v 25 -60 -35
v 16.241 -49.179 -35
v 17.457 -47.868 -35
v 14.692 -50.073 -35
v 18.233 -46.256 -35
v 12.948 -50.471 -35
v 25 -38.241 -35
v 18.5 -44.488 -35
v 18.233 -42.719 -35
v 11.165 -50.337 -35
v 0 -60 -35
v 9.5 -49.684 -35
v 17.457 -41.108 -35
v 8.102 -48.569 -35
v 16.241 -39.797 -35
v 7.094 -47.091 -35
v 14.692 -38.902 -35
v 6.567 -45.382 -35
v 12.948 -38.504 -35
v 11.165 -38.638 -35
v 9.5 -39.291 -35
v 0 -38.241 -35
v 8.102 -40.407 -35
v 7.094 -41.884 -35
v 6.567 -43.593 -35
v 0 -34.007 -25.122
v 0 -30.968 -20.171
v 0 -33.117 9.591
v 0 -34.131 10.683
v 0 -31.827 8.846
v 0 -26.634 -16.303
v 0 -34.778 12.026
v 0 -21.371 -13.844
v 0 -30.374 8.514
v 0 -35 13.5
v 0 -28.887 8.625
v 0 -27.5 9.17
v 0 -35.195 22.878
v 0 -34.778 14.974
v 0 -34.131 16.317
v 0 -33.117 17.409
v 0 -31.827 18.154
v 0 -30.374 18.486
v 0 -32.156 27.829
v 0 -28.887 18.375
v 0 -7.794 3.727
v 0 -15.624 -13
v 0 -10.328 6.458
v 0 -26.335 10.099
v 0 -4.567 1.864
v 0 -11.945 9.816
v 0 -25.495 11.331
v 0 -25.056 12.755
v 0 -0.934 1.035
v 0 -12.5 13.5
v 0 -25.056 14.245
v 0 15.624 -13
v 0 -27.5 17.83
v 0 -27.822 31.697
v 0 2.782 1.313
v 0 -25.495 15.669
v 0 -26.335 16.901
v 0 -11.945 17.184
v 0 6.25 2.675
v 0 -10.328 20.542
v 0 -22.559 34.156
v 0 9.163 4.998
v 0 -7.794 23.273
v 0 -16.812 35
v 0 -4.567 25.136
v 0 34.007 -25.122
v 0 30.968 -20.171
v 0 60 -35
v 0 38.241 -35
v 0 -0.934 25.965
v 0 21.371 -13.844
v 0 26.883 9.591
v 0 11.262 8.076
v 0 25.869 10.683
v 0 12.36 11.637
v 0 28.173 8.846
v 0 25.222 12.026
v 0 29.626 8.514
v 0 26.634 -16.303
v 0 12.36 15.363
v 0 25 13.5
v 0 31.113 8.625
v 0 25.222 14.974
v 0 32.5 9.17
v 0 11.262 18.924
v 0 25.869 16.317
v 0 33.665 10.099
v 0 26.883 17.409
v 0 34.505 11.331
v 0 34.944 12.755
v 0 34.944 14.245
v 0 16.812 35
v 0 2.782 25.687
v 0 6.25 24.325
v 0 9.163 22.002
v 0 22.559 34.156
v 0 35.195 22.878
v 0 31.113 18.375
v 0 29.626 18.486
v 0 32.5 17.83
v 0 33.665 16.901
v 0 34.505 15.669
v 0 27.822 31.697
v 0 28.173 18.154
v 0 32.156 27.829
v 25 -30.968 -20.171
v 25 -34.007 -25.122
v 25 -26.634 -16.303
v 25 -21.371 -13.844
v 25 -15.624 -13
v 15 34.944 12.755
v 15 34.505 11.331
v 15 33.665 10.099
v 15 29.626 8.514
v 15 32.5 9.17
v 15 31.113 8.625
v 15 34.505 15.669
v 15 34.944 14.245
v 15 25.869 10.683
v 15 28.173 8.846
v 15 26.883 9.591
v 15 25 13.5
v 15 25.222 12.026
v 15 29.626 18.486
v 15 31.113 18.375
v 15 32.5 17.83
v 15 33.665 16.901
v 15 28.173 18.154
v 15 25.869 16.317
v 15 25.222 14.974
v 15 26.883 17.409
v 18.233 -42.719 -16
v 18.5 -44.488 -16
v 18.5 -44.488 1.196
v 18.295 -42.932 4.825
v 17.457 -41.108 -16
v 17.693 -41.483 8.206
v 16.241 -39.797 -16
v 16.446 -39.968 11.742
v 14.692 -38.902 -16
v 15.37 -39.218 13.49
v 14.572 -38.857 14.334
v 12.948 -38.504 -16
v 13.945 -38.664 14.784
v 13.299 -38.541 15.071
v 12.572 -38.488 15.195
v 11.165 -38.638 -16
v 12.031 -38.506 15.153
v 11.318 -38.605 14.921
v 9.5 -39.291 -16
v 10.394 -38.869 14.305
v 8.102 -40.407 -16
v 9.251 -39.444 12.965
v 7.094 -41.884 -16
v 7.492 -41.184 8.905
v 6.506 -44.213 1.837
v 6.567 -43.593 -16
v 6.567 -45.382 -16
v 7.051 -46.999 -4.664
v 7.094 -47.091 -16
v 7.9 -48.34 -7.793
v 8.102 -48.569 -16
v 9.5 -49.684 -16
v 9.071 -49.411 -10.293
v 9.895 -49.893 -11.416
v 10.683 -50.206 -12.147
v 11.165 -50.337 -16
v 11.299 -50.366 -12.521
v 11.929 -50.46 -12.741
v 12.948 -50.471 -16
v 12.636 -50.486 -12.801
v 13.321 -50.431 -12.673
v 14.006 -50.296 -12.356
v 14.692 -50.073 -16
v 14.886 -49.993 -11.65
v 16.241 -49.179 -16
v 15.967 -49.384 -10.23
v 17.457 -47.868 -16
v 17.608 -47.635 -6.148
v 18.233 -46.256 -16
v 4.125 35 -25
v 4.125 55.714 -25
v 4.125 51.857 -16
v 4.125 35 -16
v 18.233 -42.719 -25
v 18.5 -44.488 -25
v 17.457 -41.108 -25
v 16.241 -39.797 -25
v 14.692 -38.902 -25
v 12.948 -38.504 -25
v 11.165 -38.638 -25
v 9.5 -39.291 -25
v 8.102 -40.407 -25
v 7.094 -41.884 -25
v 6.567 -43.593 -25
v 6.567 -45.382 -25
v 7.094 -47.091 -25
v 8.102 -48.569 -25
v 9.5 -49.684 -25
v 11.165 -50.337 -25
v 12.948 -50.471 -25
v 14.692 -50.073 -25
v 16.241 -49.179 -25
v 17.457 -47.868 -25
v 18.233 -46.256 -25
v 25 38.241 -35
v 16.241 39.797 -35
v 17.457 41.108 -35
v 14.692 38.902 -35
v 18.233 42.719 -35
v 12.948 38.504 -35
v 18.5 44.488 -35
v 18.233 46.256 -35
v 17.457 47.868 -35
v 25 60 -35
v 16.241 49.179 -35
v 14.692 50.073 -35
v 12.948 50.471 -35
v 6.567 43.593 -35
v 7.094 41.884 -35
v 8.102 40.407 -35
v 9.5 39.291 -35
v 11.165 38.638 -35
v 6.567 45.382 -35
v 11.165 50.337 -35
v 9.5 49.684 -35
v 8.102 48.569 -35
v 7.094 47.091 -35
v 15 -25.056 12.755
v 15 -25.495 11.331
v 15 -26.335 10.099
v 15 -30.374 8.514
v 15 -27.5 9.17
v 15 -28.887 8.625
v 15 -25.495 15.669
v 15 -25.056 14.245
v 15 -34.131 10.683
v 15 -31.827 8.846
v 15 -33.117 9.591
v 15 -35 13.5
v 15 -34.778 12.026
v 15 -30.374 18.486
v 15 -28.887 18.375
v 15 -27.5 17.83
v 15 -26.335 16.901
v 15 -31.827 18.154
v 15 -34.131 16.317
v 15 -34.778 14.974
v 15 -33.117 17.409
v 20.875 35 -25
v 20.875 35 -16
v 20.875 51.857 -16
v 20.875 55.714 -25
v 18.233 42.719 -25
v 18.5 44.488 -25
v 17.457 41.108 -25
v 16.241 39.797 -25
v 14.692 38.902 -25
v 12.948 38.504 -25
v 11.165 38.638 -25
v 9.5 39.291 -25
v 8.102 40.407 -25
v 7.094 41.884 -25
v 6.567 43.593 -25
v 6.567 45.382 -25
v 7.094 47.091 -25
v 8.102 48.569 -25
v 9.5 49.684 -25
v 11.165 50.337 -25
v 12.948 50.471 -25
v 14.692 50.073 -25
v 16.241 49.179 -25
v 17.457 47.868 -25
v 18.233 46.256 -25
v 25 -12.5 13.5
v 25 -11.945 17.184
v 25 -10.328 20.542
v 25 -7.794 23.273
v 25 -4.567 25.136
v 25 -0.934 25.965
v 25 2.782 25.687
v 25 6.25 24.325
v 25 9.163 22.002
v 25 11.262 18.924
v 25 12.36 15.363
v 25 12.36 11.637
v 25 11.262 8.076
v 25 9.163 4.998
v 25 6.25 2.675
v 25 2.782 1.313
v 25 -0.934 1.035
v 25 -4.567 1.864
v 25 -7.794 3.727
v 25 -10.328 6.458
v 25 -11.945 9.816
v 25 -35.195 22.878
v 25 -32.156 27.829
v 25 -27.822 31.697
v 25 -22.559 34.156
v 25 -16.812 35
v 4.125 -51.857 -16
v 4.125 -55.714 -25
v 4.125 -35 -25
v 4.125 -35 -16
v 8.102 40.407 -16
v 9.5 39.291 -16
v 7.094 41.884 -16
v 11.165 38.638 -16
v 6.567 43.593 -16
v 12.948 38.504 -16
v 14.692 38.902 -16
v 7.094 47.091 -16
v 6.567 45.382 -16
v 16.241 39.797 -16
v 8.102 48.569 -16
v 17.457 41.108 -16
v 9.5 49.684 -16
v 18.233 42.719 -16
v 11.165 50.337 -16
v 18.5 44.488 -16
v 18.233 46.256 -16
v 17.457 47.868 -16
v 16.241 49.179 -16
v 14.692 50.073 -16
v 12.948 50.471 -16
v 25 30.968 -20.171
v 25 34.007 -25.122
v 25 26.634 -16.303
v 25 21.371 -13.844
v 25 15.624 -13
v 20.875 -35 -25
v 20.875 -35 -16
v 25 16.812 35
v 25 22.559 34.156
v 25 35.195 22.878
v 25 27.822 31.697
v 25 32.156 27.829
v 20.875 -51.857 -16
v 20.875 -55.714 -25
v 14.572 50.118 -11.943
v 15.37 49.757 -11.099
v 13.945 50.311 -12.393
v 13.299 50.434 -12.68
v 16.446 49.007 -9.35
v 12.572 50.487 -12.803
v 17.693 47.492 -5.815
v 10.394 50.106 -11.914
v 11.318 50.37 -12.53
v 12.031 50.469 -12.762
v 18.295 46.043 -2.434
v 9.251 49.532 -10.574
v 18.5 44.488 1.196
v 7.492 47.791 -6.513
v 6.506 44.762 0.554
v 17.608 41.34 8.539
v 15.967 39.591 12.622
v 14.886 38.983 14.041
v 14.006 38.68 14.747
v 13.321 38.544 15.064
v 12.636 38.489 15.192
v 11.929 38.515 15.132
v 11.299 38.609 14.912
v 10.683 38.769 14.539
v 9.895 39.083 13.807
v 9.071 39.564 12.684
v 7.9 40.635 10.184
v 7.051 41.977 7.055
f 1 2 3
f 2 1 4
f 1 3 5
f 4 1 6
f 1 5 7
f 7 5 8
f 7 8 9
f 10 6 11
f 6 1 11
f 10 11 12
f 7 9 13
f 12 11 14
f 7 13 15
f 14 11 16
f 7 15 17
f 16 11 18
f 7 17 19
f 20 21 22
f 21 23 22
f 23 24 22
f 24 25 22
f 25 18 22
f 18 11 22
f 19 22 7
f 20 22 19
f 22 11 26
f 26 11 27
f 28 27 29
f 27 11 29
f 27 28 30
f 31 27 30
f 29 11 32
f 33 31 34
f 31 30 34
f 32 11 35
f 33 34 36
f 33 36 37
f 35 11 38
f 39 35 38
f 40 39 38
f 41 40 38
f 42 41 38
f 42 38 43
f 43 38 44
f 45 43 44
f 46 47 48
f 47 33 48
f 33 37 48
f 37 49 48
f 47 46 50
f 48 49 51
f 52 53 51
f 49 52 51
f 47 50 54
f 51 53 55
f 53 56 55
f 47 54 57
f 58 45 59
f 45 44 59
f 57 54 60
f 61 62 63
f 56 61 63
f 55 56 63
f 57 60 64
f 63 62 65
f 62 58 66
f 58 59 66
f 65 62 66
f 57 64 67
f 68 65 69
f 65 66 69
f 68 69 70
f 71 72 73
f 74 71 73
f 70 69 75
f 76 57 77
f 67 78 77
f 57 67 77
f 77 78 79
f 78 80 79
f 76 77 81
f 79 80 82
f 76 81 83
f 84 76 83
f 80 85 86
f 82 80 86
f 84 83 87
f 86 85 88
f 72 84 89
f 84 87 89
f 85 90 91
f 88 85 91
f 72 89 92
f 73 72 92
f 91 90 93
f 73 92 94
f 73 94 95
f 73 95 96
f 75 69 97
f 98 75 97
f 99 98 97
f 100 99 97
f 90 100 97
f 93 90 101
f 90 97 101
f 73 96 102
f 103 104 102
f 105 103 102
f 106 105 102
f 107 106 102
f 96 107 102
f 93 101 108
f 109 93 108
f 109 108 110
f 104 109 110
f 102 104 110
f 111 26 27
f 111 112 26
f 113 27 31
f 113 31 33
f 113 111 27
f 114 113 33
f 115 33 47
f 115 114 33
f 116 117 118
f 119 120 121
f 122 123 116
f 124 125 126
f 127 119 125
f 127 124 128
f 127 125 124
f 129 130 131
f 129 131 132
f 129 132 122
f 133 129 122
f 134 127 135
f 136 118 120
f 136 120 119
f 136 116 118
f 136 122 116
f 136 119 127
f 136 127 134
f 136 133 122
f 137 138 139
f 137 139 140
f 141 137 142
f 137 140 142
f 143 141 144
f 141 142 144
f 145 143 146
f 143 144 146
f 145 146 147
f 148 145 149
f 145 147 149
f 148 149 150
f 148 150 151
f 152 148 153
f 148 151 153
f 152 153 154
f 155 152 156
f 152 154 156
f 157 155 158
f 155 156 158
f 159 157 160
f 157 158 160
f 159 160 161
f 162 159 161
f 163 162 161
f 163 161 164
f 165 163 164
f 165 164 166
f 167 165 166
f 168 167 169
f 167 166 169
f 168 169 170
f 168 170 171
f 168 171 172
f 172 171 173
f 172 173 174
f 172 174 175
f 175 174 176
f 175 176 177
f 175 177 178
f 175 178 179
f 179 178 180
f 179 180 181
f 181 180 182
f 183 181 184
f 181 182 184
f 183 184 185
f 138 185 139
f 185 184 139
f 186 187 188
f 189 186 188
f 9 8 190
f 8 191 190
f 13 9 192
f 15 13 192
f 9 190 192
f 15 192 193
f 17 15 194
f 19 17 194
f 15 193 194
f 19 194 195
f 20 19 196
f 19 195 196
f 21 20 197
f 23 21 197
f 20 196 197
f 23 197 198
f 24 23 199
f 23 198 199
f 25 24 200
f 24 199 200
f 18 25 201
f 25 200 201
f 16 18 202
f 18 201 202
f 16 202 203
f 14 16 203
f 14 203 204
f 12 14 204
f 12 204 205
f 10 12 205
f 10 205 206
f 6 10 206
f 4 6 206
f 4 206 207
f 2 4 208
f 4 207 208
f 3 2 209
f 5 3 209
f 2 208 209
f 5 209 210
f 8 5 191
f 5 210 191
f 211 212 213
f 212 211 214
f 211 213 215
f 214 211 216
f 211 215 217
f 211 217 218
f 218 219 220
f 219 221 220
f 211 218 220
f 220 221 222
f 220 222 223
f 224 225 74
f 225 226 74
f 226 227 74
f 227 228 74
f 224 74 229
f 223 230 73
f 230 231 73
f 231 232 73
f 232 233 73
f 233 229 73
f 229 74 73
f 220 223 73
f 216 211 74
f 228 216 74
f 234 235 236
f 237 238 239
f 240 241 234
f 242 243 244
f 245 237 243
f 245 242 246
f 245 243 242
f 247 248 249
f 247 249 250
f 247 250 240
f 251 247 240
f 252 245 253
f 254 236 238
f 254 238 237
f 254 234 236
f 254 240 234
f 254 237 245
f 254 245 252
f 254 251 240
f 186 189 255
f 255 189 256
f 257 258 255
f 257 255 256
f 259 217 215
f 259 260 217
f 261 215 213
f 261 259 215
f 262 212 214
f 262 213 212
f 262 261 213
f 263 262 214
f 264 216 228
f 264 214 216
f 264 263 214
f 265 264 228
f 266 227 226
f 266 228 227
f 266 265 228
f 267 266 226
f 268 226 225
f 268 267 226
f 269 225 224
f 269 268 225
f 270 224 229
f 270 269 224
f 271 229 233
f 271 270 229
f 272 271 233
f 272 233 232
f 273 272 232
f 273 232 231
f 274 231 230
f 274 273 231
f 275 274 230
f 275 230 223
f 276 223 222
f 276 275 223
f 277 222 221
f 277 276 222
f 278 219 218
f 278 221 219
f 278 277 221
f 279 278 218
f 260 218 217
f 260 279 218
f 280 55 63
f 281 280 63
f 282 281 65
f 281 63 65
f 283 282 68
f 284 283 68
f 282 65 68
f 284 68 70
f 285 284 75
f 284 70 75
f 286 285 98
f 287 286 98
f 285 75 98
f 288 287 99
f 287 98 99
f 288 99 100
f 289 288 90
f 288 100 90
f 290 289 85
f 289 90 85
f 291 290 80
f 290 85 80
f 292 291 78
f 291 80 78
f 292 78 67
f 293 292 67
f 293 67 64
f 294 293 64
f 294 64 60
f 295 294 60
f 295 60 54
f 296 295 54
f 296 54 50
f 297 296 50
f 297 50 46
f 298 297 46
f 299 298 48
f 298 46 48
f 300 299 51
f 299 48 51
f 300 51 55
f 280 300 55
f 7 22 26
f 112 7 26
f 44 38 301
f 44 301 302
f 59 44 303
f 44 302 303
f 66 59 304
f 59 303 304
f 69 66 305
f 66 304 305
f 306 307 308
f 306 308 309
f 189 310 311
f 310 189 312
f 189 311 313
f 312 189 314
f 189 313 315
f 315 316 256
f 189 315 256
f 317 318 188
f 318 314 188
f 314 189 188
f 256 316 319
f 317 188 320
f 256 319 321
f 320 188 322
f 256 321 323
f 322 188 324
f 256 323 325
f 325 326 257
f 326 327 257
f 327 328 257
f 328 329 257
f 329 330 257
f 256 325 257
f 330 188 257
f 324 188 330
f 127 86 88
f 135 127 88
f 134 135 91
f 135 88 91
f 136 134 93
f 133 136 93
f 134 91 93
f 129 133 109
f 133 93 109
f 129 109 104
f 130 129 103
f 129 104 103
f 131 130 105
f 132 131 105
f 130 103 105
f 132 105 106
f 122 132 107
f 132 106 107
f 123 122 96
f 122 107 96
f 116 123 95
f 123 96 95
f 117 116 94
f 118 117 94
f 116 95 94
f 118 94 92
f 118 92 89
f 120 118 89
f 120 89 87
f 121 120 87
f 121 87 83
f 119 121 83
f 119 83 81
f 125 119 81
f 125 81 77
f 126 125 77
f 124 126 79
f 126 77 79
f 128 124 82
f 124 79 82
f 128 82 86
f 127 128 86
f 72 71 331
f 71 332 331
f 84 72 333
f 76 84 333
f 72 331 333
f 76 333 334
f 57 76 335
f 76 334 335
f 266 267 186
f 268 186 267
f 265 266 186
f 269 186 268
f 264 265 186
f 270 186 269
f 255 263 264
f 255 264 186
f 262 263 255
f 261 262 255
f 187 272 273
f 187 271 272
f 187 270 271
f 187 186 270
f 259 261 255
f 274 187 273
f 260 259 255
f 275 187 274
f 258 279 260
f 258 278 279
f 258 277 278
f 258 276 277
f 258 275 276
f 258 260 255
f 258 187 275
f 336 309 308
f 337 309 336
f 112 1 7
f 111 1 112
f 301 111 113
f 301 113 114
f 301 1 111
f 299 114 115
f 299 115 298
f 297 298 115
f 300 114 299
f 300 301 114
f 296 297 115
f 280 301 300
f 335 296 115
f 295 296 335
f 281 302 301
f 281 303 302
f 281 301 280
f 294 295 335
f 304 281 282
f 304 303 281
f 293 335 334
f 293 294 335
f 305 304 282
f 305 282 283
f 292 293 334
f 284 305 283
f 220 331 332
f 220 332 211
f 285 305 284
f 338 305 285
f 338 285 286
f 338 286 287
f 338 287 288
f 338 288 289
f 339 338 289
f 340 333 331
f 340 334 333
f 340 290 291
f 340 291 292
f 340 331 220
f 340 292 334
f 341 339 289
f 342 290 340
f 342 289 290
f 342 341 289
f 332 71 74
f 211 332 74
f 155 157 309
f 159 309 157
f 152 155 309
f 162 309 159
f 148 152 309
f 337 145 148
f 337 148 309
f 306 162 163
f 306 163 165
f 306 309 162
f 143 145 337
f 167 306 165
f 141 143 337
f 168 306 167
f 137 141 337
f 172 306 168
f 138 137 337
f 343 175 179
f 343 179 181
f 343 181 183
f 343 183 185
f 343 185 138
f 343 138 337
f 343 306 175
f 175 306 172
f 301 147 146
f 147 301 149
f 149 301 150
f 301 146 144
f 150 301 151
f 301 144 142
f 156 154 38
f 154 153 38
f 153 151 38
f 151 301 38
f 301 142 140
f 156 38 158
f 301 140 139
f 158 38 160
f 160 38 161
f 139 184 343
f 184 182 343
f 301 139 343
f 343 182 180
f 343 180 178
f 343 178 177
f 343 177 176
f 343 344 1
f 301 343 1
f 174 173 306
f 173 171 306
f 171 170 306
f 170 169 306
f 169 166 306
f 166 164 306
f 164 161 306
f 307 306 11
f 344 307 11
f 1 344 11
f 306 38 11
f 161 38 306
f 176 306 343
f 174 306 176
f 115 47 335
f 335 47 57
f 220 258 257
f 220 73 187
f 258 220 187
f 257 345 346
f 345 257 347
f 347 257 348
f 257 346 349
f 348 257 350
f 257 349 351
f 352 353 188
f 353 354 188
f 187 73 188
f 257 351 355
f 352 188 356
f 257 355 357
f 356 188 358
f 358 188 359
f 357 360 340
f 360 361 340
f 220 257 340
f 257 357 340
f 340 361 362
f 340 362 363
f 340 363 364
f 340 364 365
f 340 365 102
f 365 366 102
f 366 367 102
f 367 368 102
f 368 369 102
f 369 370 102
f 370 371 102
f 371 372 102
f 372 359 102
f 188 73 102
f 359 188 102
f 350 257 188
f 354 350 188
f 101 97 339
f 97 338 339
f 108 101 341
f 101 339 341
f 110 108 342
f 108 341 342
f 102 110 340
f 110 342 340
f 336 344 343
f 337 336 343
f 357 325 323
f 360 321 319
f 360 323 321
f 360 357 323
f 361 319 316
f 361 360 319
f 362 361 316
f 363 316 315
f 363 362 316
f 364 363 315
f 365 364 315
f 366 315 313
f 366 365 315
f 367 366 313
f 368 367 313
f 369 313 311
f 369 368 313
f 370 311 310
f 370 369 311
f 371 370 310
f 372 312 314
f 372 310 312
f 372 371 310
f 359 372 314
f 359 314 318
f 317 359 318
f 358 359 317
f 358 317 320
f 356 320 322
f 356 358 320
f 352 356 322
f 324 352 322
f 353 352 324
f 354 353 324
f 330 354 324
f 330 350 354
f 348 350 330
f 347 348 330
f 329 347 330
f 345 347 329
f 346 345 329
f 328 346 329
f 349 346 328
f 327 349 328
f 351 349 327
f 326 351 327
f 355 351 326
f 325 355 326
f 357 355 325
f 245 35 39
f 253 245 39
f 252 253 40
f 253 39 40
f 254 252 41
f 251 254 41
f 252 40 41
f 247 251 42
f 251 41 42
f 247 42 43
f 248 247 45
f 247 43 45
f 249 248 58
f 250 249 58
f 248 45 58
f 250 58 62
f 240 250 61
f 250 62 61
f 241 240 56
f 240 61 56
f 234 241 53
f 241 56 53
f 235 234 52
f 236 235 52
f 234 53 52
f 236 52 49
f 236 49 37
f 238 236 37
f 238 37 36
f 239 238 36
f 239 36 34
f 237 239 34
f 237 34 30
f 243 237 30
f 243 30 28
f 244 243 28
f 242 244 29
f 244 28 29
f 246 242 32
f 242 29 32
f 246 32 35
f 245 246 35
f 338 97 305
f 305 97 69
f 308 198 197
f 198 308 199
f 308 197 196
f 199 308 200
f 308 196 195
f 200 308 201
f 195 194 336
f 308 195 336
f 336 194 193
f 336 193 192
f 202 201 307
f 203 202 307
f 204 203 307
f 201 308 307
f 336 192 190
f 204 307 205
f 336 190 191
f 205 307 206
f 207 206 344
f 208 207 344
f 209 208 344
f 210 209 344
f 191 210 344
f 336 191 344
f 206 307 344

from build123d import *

# Parameters (mm, degrees)
F1_DEPTH  = 25
F2_R      = 5
F3_DEPTH  = 15
F5_DEPTH  = 25
F7_W      = 16.75
F7_H      = 9
F8_DEPTH  = 25
F9_R      = 6
F10_DEPTH = 50
F11_R     = 20
F2_R_2    = 12.5
F12_DEPTH = 25


# Not quite as in the source:
# - a pattern or mirror of a feature is missing from the dataset's text; its kind, count and spacing are read off the source's solid


with BuildPart() as f1:
    # F0 (on Right) → F1 (new body)
    with BuildSketch(Plane.YZ):
        Polygon((-60, -35), (60, -35), (30, 35), (-30, 35), align=None)
    extrude(amount=F1_DEPTH)

    # F2 (on face) → F3 (cut)
    with BuildSketch(Plane(origin=(0, 0, 0), x_dir=(0, -1, 0), z_dir=(-1, 0, 0))):
        with Locations((-30, 13.5)):
            Circle(F2_R)
        with Locations((30, 13.5)):
            Circle(F2_R)
    extrude(amount=-F3_DEPTH, mode=Mode.SUBTRACT)

    # F4 (on face) → F5 (cut)
    with BuildSketch(Plane(origin=(0, 0, 0), x_dir=(0, -1, 0), z_dir=(-1, 0, 0))):
        Polygon((-28.8120768404, -13), (-38.240648269, -35), (38.240648269, -35), (28.8120768404, -13), align=None)
    extrude(amount=-F5_DEPTH, mode=Mode.SUBTRACT)

    # F7 (on offset) → F8 (cut)
    with BuildSketch(Plane.XZ.offset(60)):
        with Locations((12.5, -20.5)):
            Rectangle(F7_W, F7_H)
    f8 = extrude(amount=-F8_DEPTH, mode=Mode.SUBTRACT)

    # F8_copies: F8 across plane
    add(f8.mirror(Plane.ZX), mode=Mode.SUBTRACT)

    # F9 (on face) → F10 (cut, symmetric)
    with BuildSketch(Plane.XY.offset(-25)):
        with Locations((12.5, -44.487604307)):
            Circle(F9_R)
    f10 = extrude(amount=F10_DEPTH, both=True, mode=Mode.SUBTRACT)

    # F10_copies: F10 across plane
    add(f10.mirror(Plane.ZX), mode=Mode.SUBTRACT)

    # F11
    f11_edges = [f1.edges().sort_by_distance(p)[0] for p in [
        (12.5, -28.812077, -13),
        (12.5, 28.812077, -13),
        (12.5, 30, 35),
        (12.5, -30, 35),
    ]]
    fillet(f11_edges, radius=F11_R)

    # F2 (on face) → F12 (cut)
    with BuildSketch(Plane(origin=(0, 0, 0), x_dir=(0, -1, 0), z_dir=(-1, 0, 0))):
        with Locations((0, 13.5)):
            Circle(F2_R_2)
    extrude(amount=-F12_DEPTH, mode=Mode.SUBTRACT)


solid = f1.part
